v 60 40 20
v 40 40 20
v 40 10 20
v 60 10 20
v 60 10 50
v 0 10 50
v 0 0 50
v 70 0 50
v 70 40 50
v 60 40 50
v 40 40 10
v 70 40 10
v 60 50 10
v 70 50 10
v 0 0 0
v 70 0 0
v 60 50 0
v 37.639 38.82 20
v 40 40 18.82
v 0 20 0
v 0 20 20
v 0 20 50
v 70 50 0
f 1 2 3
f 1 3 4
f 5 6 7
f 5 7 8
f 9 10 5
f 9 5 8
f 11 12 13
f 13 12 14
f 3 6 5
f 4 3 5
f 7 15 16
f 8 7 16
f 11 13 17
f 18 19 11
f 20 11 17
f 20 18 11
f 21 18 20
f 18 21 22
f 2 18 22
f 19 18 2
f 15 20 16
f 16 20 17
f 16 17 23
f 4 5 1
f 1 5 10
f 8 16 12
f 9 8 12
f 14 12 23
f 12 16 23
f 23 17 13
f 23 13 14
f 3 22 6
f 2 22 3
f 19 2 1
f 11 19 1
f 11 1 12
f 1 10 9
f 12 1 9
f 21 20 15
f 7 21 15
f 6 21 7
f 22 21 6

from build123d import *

# Parameters (mm, degrees)
SKETCH1_W           = 70
SKETCH1_H           = 50
BOSS_EXTRUDE1_DEPTH = 50
CUT_EXTRUDE1_DEPTH  = 50
SKETCH3_W           = 40
SKETCH3_H           = 10
CUT_EXTRUDE2_DEPTH  = 50
CUT_EXTRUDE3_DEPTH  = 30
BOSS_EXTRUDE2_DEPTH = 30
SKETCH9_W           = 20
SKETCH9_H           = 10
BOSS_EXTRUDE3_DEPTH = 5
CUT_EXTRUDE5_DEPTH  = 5
SKETCH15_W          = 70
SKETCH15_H          = 50
CUT_EXTRUDE10_DEPTH = 19
CUT_EXTRUDE11_DEPTH = 19
SKETCH18_W          = 67.082039325
SKETCH18_H          = 30
BOSS_EXTRUDE8_DEPTH = 10
SKETCH19_W          = 50
SKETCH19_H          = 20
CUT_EXTRUDE12_DEPTH = 10
SKETCH20_W          = 45
SKETCH20_H          = 76.778692576
CUT_EXTRUDE13_DEPTH = 28
CUT_EXTRUDE14_DEPTH = 28
SKETCH22_W          = 20
SKETCH22_H          = 10
CUT_EXTRUDE15_DEPTH = 30
CUT_EXTRUDE16_DEPTH = 10
CUT_EXTRUDE17_DEPTH = 10
CUT_EXTRUDE18_DEPTH = 10
CUT_EXTRUDE19_DEPTH = 5


with BuildPart() as part:
    # Sketch1 → Boss-Extrude1 (new body)
    with BuildSketch(Plane.XY):
        with Locations((35, 25)):
            Rectangle(SKETCH1_W, SKETCH1_H)
    extrude(amount=BOSS_EXTRUDE1_DEPTH)

    # Sketch2 → Cut-Extrude1 (cut)
    with BuildSketch(Plane.XY.offset(50)):
        Polygon((0, 50), (60, 50), (0, 20), align=None)
    extrude(amount=-CUT_EXTRUDE1_DEPTH, mode=Mode.SUBTRACT)

    # Sketch3 → Cut-Extrude2 (cut)
    with BuildSketch(Plane(origin=(70, 0, 0), x_dir=(0, 0, -1), z_dir=(1, 0, 0))):
        with Locations((-30, 45)):
            Rectangle(SKETCH3_W, SKETCH3_H)
    extrude(amount=-CUT_EXTRUDE2_DEPTH, mode=Mode.SUBTRACT)

    # Sketch4 → Cut-Extrude3 (cut)
    with BuildSketch(Plane.XY.offset(50)):
        Polygon((60, 10), (60, 40), (40, 40), (0, 20), (0, 10), align=None)
    extrude(amount=-CUT_EXTRUDE3_DEPTH, mode=Mode.SUBTRACT)

    # Sketch8 → Boss-Extrude2 (add)
    with BuildSketch(Plane(origin=(-8, 16, 0), x_dir=(0.894427191, 0.447213595, 0), z_dir=(-0.447213595, 0.894427191, 0))):
        Polygon((8.94427191, -20), (8.94427191, -40), (53.66563146, -20), align=None)
    extrude(amount=-BOSS_EXTRUDE2_DEPTH)

    # Sketch9 → Boss-Extrude3 (add)
    with BuildSketch(Plane.ZY):
        with Locations((30, 15)):
            Rectangle(SKETCH9_W, SKETCH9_H)
    extrude(amount=-BOSS_EXTRUDE3_DEPTH)

    # Sketch10 → Cut-Extrude5 (cut)
    with BuildSketch(Plane.XZ):
        Polygon((10, 40), (27.082039325, 33.16718427), (27.082039325, 20), (10, 20), align=None)
    extrude(amount=CUT_EXTRUDE5_DEPTH, mode=Mode.SUBTRACT)

    # Sketch15 → Cut-Extrude10 (cut)
    with BuildSketch(Plane(origin=(0, 0, 0), x_dir=(-1, 0, 0), z_dir=(0, -1, 0))):
        with Locations((-35, -25)):
            Rectangle(SKETCH15_W, SKETCH15_H)
    extrude(amount=CUT_EXTRUDE10_DEPTH, mode=Mode.SUBTRACT)

    # Sketch16 → Cut-Extrude11 (cut)
    with BuildSketch(Plane(origin=(14.666666667, 7.333333333, 36.666666667), x_dir=(0.930949336, -0.071611487, -0.358057437), z_dir=(0.365148372, 0.182574186, 0.912870929))):
        Polygon((-15.754527229, 11.766968108), (-10.383665674, 12.159200379), (-10.383665674, 1.961161351), (-16.527761833, 3.611754734), align=None)
    extrude(amount=CUT_EXTRUDE11_DEPTH, mode=Mode.SUBTRACT)

    # Sketch18 → Boss-Extrude8 (add)
    with BuildSketch(Plane(origin=(20, 0, 40), x_dir=(0.894427191, 0, -0.447213595), z_dir=(0.447213595, 0, 0.894427191))):
        with Locations((11.180339888, 25)):
            Rectangle(SKETCH18_W, SKETCH18_H)
    extrude(amount=-BOSS_EXTRUDE8_DEPTH)

    # Sketch19 → Cut-Extrude12 (cut)
    with BuildSketch(Plane.ZY):
        with Locations((25, 10)):
            Rectangle(SKETCH19_W, SKETCH19_H)
    extrude(amount=CUT_EXTRUDE12_DEPTH, mode=Mode.SUBTRACT)

    # Sketch20 → Cut-Extrude13 (cut)
    with BuildSketch(Plane(origin=(-8, 16, 0), x_dir=(0.894427191, 0.447213595, 0), z_dir=(-0.447213595, 0.894427191, 0))):
        with Locations((31.44427191, -38.389346288)):
            Rectangle(SKETCH20_W, SKETCH20_H)
    extrude(amount=CUT_EXTRUDE13_DEPTH, mode=Mode.SUBTRACT)

    # Sketch21 → Cut-Extrude14 (cut)
    with BuildSketch(Plane(origin=(8, 4, 0), x_dir=(0, 0, -1), z_dir=(0.894427191, 0.447213595, 0))):
        Polygon((-50, 17.88854382), (-38.819660113, 17.88854382), (-41.05572809, 27.88854382), align=None)
    extrude(amount=-CUT_EXTRUDE14_DEPTH, mode=Mode.SUBTRACT)

    # Sketch22 → Cut-Extrude15 (cut)
    with BuildSketch(Plane(origin=(0, 40, 0), x_dir=(1, 0, 0), z_dir=(0, 1, 0))):
        with Locations((50, -25)):
            Rectangle(SKETCH22_W, SKETCH22_H)
    extrude(amount=-CUT_EXTRUDE15_DEPTH, mode=Mode.SUBTRACT)

    # Sketch23 → Cut-Extrude16 (cut)
    with BuildSketch(Plane(origin=(24, 0, 32), x_dir=(0.8, 0, -0.6), z_dir=(0.6, 0, 0.8))):
        Polygon((20, 40), (-30, 20), (-30, 10), (20, 10), align=None)
    extrude(amount=CUT_EXTRUDE16_DEPTH, mode=Mode.SUBTRACT)

    # Sketch24 → Cut-Extrude17 (cut)
    with BuildSketch(Plane(origin=(-8.827586207, 27.586206897, 6.620689655), x_dir=(0.954842468, 0.288908462, 0.069338031), z_dir=(0.297112541, -0.928476691, -0.222834406))):
        Polygon((51.136797811, 10.112827941), (51.136797811, 20.396796046), (9.245070791, 43.95190605), align=None)
    extrude(amount=-CUT_EXTRUDE17_DEPTH, mode=Mode.SUBTRACT)

    # Sketch25 → Cut-Extrude18 (cut)
    with BuildSketch(Plane(origin=(40, 0, 0), x_dir=(0, 0, -1), z_dir=(1, 0, 0))):
        Polygon((-30, 40), (-20, 40), (-30, 37.6), align=None)
    extrude(amount=-CUT_EXTRUDE18_DEPTH, mode=Mode.SUBTRACT)

    # Sketch26 → Cut-Extrude19 (cut)
    with BuildSketch(Plane(origin=(20, 0, 40), x_dir=(0.894427191, 0, -0.447213595), z_dir=(0.447213595, 0, 0.894427191))):
        Polygon((21.632516526, 39.674355495), (22.360679775, 40), (22.360679775, 37.6), align=None)
    extrude(amount=-CUT_EXTRUDE19_DEPTH, mode=Mode.SUBTRACT)


solid = part.part
